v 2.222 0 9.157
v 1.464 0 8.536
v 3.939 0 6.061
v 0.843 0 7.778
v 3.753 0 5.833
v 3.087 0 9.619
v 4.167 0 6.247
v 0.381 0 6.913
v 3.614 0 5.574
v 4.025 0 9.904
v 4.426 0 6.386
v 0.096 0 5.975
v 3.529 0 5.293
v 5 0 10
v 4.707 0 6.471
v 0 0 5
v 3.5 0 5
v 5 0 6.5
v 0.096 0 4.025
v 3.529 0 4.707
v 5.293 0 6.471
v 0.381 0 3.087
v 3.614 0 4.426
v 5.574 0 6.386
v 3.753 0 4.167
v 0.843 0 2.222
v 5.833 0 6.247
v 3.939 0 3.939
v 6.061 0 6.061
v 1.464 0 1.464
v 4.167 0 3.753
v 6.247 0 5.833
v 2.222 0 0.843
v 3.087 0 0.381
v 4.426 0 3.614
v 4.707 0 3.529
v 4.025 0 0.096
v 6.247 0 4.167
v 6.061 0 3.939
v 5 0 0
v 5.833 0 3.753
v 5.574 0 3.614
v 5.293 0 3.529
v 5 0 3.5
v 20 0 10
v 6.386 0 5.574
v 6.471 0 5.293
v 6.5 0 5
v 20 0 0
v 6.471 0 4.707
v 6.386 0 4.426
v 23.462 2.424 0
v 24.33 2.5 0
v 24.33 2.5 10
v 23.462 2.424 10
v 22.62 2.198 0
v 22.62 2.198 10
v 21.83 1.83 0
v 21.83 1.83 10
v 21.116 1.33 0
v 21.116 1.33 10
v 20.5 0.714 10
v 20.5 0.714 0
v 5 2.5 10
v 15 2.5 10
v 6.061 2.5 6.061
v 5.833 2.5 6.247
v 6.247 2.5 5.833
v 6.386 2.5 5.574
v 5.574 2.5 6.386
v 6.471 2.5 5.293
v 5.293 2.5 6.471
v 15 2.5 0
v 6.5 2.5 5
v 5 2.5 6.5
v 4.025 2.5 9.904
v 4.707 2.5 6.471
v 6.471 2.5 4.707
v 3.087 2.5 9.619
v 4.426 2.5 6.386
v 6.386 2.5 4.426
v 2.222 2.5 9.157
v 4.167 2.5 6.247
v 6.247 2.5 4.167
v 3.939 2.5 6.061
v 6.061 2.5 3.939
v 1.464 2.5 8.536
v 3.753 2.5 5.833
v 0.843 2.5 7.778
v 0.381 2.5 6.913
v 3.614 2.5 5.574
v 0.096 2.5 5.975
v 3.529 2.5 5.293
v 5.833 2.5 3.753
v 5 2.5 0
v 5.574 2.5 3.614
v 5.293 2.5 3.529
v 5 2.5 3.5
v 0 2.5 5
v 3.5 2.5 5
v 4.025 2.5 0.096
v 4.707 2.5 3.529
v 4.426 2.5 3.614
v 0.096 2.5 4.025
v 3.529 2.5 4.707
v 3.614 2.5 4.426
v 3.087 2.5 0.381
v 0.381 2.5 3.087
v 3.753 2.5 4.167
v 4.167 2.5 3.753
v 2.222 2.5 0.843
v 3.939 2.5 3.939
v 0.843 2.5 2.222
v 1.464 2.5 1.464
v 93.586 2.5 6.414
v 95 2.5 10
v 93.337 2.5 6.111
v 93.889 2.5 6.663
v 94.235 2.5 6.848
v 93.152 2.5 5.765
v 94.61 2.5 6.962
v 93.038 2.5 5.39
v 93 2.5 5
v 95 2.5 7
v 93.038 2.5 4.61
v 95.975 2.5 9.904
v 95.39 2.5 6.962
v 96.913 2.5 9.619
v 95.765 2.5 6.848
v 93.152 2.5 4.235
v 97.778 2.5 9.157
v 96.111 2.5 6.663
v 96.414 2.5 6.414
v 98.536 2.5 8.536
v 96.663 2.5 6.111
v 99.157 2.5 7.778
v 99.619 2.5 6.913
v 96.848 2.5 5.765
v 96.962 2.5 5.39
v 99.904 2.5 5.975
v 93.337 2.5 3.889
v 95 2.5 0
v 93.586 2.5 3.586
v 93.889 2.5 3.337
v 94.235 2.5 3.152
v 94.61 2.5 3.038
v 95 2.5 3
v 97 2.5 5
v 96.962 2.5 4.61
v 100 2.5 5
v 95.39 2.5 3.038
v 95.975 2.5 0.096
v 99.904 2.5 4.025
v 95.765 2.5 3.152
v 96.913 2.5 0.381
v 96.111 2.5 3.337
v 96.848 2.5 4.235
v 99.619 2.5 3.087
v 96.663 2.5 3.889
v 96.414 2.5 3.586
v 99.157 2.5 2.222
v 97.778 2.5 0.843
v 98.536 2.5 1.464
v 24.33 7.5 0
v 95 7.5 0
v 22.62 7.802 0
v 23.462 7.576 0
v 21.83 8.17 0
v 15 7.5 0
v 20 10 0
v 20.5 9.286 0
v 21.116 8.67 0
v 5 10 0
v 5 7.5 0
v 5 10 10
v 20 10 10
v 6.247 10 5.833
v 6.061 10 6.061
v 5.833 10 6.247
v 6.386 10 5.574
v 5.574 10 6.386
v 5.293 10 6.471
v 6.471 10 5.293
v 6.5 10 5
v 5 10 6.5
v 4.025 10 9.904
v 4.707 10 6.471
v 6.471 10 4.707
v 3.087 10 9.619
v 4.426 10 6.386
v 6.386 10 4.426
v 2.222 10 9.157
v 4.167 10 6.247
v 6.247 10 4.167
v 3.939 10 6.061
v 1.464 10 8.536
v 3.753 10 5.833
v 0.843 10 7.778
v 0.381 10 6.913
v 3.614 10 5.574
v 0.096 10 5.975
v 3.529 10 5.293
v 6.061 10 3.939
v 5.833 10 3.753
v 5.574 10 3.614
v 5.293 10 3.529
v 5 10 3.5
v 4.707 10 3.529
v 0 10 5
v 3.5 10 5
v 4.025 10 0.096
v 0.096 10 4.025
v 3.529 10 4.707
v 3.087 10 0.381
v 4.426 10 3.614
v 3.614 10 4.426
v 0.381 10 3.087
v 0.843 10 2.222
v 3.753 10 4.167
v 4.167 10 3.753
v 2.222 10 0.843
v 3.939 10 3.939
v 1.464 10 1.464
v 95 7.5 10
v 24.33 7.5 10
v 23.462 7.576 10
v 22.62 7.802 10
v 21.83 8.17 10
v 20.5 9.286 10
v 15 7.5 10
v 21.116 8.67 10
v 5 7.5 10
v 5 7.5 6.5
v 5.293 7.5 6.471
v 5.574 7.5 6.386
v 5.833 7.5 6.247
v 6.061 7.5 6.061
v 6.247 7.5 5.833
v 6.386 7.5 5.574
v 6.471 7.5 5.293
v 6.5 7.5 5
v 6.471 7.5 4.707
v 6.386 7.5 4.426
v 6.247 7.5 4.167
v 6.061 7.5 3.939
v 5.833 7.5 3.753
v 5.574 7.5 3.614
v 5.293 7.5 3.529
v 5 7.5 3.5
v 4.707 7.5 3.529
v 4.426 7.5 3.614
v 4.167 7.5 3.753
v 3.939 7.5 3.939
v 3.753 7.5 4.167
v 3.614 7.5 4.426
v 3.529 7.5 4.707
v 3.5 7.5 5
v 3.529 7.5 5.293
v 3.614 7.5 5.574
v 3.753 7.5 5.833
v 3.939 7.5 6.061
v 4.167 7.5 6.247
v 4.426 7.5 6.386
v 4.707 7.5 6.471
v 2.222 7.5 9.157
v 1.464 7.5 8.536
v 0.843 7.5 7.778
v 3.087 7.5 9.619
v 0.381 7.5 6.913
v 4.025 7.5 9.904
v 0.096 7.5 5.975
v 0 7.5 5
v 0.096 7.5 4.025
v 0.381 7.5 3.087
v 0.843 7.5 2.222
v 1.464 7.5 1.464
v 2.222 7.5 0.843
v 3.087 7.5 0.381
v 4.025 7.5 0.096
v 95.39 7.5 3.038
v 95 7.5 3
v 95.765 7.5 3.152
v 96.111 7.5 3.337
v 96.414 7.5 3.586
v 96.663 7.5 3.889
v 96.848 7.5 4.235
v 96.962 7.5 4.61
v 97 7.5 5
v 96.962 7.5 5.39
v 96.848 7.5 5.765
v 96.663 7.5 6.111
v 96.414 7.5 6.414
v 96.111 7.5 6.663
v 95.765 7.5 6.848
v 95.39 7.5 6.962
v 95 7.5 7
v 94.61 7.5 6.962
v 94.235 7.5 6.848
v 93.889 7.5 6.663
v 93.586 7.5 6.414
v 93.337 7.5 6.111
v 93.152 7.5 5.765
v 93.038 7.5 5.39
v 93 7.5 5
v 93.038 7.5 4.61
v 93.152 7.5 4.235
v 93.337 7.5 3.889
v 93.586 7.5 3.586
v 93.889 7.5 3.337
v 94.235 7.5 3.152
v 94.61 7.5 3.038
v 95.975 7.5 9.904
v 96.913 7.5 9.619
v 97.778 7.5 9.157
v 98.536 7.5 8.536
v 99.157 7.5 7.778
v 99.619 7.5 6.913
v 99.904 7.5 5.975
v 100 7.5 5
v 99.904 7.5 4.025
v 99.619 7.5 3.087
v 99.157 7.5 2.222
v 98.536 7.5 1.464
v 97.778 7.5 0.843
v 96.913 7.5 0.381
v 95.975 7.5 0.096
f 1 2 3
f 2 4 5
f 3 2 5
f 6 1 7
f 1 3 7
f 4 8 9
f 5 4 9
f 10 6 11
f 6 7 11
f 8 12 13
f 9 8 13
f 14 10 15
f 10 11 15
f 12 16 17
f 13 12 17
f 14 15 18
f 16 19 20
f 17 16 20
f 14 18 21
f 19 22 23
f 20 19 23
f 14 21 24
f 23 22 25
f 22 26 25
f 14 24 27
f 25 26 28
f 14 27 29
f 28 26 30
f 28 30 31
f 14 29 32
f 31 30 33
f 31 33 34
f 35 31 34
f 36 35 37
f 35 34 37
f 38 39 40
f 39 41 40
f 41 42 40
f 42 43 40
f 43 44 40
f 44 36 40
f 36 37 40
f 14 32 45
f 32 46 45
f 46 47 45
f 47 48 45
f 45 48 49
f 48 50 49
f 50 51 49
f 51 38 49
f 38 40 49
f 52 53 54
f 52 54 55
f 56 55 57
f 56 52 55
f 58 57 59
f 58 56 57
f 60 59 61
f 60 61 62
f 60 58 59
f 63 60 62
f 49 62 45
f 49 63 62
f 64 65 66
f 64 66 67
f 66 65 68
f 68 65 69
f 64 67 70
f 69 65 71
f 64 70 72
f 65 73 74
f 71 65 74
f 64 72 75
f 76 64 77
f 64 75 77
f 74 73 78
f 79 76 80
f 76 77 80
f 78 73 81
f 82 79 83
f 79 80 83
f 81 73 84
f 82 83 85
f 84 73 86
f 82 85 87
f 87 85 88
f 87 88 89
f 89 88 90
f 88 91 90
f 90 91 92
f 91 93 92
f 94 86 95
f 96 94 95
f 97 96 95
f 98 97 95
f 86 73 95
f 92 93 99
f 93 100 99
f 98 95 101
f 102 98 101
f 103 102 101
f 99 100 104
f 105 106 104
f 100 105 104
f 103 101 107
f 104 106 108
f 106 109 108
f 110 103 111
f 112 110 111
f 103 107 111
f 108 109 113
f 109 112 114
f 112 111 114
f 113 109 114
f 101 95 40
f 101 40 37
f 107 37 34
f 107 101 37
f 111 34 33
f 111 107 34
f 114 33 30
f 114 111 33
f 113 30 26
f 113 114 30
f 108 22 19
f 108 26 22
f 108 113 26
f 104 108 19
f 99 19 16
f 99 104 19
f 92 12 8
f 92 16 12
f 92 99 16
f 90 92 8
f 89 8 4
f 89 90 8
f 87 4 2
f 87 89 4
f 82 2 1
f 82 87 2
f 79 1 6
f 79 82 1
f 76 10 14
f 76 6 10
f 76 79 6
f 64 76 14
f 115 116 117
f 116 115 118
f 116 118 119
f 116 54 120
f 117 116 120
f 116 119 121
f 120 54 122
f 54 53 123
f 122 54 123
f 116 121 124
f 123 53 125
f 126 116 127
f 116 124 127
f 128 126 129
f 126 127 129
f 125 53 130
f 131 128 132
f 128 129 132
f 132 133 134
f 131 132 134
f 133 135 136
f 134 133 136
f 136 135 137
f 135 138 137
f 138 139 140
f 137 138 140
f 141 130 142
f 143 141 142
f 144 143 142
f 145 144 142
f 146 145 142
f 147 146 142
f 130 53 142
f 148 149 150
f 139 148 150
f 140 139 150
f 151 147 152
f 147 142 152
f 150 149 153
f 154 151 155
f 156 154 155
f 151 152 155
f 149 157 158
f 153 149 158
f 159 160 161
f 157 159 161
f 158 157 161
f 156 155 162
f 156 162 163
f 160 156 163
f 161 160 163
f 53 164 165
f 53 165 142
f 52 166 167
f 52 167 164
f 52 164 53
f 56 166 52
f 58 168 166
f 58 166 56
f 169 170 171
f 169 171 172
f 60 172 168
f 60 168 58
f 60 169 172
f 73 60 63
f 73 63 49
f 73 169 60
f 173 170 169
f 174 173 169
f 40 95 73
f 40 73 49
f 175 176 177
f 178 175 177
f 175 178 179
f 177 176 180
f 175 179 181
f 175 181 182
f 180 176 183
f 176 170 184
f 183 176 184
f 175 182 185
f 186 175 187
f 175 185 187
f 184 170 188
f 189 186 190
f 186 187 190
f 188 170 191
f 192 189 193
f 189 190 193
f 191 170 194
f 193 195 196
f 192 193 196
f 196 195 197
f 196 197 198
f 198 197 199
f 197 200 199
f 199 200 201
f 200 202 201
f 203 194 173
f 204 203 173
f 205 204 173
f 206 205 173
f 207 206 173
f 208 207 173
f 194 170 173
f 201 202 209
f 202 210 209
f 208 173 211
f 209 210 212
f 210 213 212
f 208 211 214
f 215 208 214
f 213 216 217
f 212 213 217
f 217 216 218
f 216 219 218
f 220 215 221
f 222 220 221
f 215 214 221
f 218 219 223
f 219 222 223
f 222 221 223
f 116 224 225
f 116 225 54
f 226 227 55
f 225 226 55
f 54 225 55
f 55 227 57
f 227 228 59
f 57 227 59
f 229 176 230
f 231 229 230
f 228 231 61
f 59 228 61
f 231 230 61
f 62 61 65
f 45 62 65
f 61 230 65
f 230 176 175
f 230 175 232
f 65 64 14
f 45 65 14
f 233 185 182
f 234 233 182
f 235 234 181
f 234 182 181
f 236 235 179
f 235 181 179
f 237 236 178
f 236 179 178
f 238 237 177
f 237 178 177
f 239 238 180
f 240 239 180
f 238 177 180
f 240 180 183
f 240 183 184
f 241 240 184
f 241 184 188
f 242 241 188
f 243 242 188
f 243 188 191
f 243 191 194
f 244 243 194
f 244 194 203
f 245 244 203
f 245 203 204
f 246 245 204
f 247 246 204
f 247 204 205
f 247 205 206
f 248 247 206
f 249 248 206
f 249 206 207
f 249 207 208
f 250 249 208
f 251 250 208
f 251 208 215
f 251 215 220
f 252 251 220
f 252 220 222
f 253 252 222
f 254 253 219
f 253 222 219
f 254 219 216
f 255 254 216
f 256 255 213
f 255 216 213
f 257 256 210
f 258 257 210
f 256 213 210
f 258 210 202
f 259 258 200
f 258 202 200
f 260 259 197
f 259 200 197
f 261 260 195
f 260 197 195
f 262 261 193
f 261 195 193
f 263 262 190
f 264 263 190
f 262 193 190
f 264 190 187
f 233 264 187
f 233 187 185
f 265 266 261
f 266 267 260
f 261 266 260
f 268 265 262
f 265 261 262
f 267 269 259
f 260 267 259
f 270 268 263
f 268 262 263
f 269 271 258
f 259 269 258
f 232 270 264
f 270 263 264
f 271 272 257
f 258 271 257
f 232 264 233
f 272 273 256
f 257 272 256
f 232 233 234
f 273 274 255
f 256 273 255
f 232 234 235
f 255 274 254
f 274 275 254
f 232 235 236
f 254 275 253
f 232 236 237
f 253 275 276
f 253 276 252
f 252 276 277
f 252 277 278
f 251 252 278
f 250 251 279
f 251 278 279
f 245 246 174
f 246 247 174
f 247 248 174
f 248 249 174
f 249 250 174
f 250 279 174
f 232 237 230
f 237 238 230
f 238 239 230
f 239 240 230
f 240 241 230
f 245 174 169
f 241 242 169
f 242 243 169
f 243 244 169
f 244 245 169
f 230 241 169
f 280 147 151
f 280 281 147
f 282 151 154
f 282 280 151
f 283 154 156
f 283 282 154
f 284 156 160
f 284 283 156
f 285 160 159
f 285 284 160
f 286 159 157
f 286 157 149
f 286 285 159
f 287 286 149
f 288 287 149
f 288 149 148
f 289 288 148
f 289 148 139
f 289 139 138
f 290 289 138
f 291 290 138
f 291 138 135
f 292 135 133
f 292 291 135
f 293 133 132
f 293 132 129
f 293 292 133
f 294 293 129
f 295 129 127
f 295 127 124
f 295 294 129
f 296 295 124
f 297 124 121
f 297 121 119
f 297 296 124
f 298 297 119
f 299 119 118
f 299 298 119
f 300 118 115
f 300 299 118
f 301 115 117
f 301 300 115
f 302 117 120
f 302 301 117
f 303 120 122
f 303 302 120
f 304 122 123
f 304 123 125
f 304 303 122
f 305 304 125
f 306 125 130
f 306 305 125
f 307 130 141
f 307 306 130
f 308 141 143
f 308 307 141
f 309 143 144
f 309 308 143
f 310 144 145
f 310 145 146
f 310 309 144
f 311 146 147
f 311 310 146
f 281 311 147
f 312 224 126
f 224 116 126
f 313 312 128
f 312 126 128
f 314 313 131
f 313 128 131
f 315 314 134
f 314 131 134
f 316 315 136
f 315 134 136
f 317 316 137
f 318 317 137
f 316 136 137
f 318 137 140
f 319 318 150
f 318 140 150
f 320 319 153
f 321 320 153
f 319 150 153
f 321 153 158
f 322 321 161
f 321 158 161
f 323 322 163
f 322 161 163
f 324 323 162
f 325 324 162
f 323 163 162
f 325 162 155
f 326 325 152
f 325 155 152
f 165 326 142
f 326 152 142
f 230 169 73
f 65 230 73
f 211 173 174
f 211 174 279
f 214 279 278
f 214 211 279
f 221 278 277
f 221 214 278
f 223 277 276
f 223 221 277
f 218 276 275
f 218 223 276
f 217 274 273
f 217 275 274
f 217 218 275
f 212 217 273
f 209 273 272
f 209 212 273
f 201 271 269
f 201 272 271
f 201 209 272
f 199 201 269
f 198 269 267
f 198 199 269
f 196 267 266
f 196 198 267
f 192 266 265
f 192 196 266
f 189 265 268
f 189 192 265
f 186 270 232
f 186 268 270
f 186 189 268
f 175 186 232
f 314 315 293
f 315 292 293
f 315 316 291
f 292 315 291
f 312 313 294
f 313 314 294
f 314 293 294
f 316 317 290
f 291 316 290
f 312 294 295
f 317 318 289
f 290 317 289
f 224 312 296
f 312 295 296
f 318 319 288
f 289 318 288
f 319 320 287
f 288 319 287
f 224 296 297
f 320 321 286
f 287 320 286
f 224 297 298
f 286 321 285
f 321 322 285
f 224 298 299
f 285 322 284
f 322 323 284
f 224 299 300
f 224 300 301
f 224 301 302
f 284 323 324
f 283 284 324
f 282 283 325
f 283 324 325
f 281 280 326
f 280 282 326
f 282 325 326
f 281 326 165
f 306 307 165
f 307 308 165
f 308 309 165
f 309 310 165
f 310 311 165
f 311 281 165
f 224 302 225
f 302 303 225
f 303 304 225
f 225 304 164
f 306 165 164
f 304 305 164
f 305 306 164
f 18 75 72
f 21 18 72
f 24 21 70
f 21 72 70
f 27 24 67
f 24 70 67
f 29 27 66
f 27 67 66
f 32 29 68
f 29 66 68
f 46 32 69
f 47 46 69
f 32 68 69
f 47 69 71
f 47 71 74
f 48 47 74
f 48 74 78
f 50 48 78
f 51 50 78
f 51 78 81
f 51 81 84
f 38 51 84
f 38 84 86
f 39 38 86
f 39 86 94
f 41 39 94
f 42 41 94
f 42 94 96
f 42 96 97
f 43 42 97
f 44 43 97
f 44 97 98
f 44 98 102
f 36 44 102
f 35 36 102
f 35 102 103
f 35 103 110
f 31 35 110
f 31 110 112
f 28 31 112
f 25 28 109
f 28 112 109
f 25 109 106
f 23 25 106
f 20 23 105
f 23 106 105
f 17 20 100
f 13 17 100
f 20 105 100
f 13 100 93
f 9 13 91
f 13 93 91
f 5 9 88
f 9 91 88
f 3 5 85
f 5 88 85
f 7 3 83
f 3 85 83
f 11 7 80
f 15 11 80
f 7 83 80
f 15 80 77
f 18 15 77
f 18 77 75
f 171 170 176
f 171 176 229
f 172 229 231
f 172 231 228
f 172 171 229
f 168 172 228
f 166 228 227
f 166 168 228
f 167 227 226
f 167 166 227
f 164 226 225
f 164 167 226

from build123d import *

# Parameters (mm, degrees)
SALIENTE_EXTRUIR1_DEPTH = 10
CROQUIS2_R              = 1.5
CORTAR_EXTRUIR1_DEPTH   = 10
CROQUIS3_W              = 15
CROQUIS3_H              = 2.5
CORTAR_EXTRUIR2_DEPTH   = 10
CROQUIS4_R              = 1.5
CORTAR_EXTRUIR3_DEPTH   = 10
CORTAR_EXTRUIR5_DEPTH   = 10
CROQUIS9_R              = 2
SALIENTE_EXTRUIR2_DEPTH = 2.5
CROQUIS10_W             = 80
CROQUIS10_H             = 16.68210675
CROQUIS10_H_2           = 15.952607418
CORTAR_EXTRUIR6_DEPTH   = 10
REDONDEO1_R             = 5


with BuildPart() as part:
    # Croquis1 → Saliente-Extruir1 (new body)
    with BuildSketch(Plane.XY):
        Polygon((0, 0), (105, 0), (105, 2.5), (105, 7.5), (105, 10), (0, 10), (0, 7.5), (15, 7.5), (15, 2.5), (0, 2.5), align=None)
    extrude(amount=SALIENTE_EXTRUIR1_DEPTH)

    # Croquis2 → Cortar-Extruir1 (cut)
    with BuildSketch(Plane(origin=(0, 10, 0), x_dir=(1, 0, 0), z_dir=(0, 1, 0))):
        with Locations(Location((5, -5, 0), (0, 0, 270))):
            Circle(CROQUIS2_R)
        with BuildLine():
            Line((-4.031911586, 0), (5, 0))
            ThreePointArc((5, 0), (0, -5), (5, -10))
            Line((5, -10), (-4.031911586, -10))
            Line((-4.031911586, -10), (-4.031911586, 0))
        make_face()
    extrude(amount=-CORTAR_EXTRUIR1_DEPTH, mode=Mode.SUBTRACT)

    # Croquis3 → Cortar-Extruir2 (cut)
    with BuildSketch(Plane(origin=(0, 10, 0), x_dir=(1, 0, 0), z_dir=(0, 1, 0))):
        with Locations((97.5, -1.25)):
            Rectangle(CROQUIS3_W, CROQUIS3_H)
        with Locations((97.5, -8.75)):
            Rectangle(CROQUIS3_W, CROQUIS3_H)
    extrude(amount=-CORTAR_EXTRUIR2_DEPTH, mode=Mode.SUBTRACT)

    # Croquis4 → Cortar-Extruir3 (cut)
    with BuildSketch(Plane.XY.offset(7.5)):
        with Locations((100, 5)):
            Circle(CROQUIS4_R)
        with BuildLine():
            Line((100, 10), (171.112400038, 10))
            Line((171.112400038, 10), (171.112400038, 0))
            Line((171.112400038, 0), (100, 0))
            ThreePointArc((100, 0), (105, 5), (100, 10))
        make_face()
    extrude(amount=-CORTAR_EXTRUIR3_DEPTH, mode=Mode.SUBTRACT)

    # Croquis8 → Cortar-Extruir5 (cut)
    with BuildSketch(Plane.XY.offset(7.5)):
        with BuildLine():
            Line((90, 0), (100, 0))
            ThreePointArc((100, 0), (105, 5), (100, 10))
            Line((100, 10), (90, 10))
            Line((90, 10), (90, 0))
        make_face()
    extrude(amount=-CORTAR_EXTRUIR5_DEPTH, mode=Mode.SUBTRACT)

    # Croquis9 → Saliente-Extruir2 (add, symmetric)
    with BuildSketch(Plane(origin=(0, 5, 0), x_dir=(-1, 0, 0), z_dir=(0, -1, 0))):
        with BuildLine():
            Line((-90, -10), (-95, -10))
            ThreePointArc((-95, -10), (-100, -5), (-95, 0))
            Line((-95, 0), (-90, 0))
            Line((-90, 0), (-90, -10))
        make_face()
        with Locations(Location((-95, -5, 0), (0, 0, 90))):
            Circle(CROQUIS9_R, mode=Mode.SUBTRACT)
    extrude(amount=SALIENTE_EXTRUIR2_DEPTH, both=True)

    # Croquis10 → Cortar-Extruir6 (cut)
    with BuildSketch(Plane(origin=(0, 0, 0), x_dir=(-1, 0, 0), z_dir=(0, 0, -1))):
        with Locations((-60, 15.841053375)):
            Rectangle(CROQUIS10_W, CROQUIS10_H)
        with Locations((-60, -5.476303709)):
            Rectangle(CROQUIS10_W, CROQUIS10_H_2)
    extrude(amount=-CORTAR_EXTRUIR6_DEPTH, mode=Mode.SUBTRACT)

    # Redondeo1
    # the kernel refuses this fillet: 5 mm, written as the material it adds along each edge
    with BuildSketch(Plane(origin=(20, 2.5, 0), x_dir=(1, 0, 0), z_dir=(0, 0, 1))) as redondeo1_piece_1:
        with BuildLine():
            CenterArc((4.330127019, -5), REDONDEO1_R, 90, 60)
            Line((0, -2.5), (-0.08660254, -2.45))
            ThreePointArc((-0.08660254, -2.45), (-0.1, -1.25), (-0.1, 0))
            Line((-0.1, 0), (0, 0.1))
            Line((0, 0.1), (4.330127019, 0.1))
            Line((4.330127019, 0.1), (4.330127019, 0))
        make_face()
    extrude(amount=10)
    with BuildSketch(Plane(origin=(20, 7.5, 0), x_dir=(0, 1, 0), z_dir=(0, 0, 1))) as redondeo1_piece_2:
        with BuildLine():
            CenterArc((5, -4.330127019), REDONDEO1_R, 120, 60)
            Line((0, -4.330127019), (-0.1, -4.330127019))
            Line((-0.1, -4.330127019), (-0.1, 0))
            Line((-0.1, 0), (0, 0.1))
            ThreePointArc((0, 0.1), (1.25, 0.1), (2.45, 0.08660254))
            Line((2.45, 0.08660254), (2.5, 0))
        make_face()
    extrude(amount=10)


solid = part.part
